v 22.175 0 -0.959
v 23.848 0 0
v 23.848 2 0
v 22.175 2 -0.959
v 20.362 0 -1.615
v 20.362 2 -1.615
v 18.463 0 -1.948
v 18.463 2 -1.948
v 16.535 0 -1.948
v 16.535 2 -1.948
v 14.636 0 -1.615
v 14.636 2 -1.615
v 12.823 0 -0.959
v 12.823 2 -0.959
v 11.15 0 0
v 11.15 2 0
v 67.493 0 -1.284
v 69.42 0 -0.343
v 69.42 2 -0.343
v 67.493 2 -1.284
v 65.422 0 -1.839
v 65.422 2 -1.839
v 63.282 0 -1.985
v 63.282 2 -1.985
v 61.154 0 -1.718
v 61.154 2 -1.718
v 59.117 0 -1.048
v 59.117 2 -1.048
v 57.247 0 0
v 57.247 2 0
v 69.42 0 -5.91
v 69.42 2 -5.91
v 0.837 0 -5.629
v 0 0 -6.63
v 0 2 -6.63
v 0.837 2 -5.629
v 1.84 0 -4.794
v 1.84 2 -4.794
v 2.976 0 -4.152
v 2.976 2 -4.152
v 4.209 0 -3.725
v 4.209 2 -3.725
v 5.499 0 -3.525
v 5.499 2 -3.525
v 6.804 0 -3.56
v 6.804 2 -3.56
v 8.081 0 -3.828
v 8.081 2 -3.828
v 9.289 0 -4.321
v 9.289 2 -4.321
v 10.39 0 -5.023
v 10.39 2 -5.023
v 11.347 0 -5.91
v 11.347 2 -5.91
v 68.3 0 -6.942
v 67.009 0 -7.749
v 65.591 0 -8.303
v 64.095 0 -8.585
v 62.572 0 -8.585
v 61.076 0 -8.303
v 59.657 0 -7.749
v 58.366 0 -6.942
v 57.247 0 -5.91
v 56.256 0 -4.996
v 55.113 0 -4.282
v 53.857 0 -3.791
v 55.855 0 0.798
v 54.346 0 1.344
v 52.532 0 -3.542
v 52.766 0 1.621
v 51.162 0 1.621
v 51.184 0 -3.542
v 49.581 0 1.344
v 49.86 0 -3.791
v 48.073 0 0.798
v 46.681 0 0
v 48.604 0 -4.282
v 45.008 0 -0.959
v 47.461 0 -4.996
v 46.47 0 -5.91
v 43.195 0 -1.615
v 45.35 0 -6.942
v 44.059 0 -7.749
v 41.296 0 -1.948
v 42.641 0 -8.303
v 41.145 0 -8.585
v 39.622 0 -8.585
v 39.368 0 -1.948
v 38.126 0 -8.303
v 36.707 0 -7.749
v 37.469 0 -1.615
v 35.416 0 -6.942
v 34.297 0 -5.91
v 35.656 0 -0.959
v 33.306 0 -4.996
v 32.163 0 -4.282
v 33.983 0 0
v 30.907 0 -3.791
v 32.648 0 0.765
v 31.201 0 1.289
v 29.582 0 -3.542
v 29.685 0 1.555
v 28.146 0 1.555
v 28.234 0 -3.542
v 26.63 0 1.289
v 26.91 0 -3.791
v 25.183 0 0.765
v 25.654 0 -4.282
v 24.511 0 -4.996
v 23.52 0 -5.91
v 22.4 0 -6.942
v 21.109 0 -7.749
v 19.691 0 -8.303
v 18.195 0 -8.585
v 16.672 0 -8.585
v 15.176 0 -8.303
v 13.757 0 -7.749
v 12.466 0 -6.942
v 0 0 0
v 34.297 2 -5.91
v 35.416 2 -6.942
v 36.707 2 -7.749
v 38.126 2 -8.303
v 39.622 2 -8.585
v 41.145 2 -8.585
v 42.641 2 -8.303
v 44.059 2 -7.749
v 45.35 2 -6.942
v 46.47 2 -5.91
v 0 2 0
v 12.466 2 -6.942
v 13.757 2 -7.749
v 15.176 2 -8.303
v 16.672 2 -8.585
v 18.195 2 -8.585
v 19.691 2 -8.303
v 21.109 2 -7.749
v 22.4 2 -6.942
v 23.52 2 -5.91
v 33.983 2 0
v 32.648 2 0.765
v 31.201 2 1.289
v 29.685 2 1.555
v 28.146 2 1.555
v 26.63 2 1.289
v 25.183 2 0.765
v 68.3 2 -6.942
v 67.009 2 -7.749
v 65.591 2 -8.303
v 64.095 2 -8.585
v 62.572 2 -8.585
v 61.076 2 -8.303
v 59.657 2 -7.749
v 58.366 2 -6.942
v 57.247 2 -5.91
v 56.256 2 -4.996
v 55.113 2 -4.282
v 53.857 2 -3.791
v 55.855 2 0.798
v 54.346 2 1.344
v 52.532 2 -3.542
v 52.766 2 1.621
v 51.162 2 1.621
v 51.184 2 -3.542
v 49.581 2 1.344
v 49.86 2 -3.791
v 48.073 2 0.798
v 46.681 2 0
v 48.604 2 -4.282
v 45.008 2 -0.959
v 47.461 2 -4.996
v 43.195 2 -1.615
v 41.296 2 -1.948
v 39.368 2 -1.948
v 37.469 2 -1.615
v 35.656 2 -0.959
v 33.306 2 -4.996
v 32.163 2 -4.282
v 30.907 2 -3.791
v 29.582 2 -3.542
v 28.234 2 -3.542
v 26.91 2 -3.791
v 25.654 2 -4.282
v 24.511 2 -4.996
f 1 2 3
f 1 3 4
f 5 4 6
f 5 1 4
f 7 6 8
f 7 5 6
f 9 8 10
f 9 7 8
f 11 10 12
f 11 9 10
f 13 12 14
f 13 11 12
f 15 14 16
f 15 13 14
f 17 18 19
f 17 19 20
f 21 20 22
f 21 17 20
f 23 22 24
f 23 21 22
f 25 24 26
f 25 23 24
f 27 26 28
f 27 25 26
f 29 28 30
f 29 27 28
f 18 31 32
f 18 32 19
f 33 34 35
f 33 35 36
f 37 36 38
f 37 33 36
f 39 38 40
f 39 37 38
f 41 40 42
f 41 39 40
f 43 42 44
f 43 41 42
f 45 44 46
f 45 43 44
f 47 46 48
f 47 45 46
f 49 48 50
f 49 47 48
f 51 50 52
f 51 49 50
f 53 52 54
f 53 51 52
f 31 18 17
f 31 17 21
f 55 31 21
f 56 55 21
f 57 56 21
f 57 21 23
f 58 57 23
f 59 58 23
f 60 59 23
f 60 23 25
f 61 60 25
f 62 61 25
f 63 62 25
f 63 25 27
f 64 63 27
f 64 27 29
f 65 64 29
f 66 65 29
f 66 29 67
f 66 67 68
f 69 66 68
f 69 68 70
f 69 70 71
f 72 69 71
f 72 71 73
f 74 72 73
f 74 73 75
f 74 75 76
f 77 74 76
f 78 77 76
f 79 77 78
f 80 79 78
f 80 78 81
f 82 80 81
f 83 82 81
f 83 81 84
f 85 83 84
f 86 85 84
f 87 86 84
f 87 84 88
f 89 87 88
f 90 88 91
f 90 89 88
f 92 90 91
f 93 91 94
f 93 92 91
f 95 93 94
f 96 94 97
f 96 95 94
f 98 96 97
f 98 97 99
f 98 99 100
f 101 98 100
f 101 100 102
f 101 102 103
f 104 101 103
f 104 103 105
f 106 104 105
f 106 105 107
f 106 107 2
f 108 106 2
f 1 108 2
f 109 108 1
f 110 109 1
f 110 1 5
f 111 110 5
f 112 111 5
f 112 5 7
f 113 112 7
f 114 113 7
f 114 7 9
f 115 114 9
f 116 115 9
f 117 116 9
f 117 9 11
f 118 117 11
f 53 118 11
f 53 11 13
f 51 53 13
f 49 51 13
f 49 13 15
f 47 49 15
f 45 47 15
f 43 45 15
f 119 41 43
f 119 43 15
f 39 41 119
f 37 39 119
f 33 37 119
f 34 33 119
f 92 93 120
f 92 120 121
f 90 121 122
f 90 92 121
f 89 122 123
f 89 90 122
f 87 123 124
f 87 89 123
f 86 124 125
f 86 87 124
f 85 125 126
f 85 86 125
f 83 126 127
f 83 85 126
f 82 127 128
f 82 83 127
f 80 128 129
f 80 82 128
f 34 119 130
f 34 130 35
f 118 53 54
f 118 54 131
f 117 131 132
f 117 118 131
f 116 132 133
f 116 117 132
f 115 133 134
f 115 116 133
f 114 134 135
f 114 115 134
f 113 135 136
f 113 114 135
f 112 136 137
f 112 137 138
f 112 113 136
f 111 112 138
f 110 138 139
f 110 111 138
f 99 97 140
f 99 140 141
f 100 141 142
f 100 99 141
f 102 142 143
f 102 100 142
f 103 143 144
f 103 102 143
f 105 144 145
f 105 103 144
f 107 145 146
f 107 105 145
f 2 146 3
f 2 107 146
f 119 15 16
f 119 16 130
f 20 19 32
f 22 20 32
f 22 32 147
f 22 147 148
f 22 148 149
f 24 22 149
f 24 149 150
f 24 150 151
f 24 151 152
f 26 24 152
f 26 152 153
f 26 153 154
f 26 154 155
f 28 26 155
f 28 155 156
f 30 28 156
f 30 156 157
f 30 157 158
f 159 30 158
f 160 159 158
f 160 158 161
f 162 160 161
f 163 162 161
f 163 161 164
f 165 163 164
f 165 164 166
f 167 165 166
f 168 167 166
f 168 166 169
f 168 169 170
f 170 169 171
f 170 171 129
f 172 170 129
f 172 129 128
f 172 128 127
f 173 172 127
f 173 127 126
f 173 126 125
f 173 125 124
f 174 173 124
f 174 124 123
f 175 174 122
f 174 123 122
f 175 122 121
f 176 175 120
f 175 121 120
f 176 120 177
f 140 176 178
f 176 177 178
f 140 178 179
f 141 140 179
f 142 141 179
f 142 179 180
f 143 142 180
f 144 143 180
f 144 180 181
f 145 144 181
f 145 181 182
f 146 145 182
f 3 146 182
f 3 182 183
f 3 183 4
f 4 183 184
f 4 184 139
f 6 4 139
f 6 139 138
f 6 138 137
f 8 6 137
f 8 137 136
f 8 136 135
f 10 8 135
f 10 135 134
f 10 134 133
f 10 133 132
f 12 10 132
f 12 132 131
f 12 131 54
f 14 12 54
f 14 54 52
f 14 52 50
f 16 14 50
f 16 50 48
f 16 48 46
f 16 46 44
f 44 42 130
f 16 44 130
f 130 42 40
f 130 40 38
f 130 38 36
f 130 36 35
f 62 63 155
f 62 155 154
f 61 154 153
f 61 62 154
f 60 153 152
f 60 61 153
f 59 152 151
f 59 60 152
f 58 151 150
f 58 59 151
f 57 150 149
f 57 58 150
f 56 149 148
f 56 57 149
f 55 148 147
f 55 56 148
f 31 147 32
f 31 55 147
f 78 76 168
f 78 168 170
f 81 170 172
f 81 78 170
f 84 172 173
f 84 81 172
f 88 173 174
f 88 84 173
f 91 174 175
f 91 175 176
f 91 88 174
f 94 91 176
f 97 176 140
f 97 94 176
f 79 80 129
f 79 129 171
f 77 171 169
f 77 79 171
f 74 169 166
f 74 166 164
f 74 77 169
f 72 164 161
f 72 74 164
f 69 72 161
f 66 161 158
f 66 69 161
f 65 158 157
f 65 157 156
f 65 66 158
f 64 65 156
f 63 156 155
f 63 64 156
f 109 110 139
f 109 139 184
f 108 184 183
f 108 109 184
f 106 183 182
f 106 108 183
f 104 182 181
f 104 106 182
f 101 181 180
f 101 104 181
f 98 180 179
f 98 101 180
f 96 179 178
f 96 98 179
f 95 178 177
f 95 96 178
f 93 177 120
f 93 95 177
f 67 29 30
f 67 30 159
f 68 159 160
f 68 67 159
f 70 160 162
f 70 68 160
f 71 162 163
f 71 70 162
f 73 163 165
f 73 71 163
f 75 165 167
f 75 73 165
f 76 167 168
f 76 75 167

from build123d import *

# Parameters (mm, degrees)
BOSS_EXTRUDE1_DEPTH = 2


with BuildPart() as part:
    # Sketch2 → Boss-Extrude1 (new body)
    with BuildSketch(Plane(origin=(0, 0, 0), x_dir=(1, 0, 0), z_dir=(0, 1, 0))):
        with BuildLine():
            Line((0, 0), (0, 6.63))
            ThreePointArc((0, 6.63), (5.49918056, 3.525064844), (11.346717944, 5.91))
            ThreePointArc((11.346717944, 5.91), (17.433302094, 8.62038484), (23.519886243, 5.91))
            ThreePointArc((23.519886243, 5.91), (28.908302094, 3.510512821), (34.296717944, 5.91))
            ThreePointArc((34.296717944, 5.91), (40.383302094, 8.62038484), (46.469886243, 5.91))
            ThreePointArc((46.469886243, 5.91), (51.858302094, 3.510512821), (57.246717944, 5.91))
            ThreePointArc((57.246717944, 5.91), (63.333302094, 8.62038484), (69.419886243, 5.91))
            Line((69.419886243, 5.91), (69.419886243, 0.34303853))
            ThreePointArc((69.419886243, 0.34303853), (63.282196464, 1.985068989), (57.246717944, 0))
            ThreePointArc((57.246717944, 0), (51.963740367, -1.655479057), (46.680762789, 0))
            ThreePointArc((46.680762789, 0), (40.331907408, 1.989483575), (33.983052027, 0))
            ThreePointArc((33.983052027, 0), (28.915381395, -1.58801026), (23.847710762, 0))
            ThreePointArc((23.847710762, 0), (17.498855381, 1.989483575), (11.15, 0))
            Line((11.15, 0), (0, 0))
        make_face()
    extrude(amount=BOSS_EXTRUDE1_DEPTH)


solid = part.part
